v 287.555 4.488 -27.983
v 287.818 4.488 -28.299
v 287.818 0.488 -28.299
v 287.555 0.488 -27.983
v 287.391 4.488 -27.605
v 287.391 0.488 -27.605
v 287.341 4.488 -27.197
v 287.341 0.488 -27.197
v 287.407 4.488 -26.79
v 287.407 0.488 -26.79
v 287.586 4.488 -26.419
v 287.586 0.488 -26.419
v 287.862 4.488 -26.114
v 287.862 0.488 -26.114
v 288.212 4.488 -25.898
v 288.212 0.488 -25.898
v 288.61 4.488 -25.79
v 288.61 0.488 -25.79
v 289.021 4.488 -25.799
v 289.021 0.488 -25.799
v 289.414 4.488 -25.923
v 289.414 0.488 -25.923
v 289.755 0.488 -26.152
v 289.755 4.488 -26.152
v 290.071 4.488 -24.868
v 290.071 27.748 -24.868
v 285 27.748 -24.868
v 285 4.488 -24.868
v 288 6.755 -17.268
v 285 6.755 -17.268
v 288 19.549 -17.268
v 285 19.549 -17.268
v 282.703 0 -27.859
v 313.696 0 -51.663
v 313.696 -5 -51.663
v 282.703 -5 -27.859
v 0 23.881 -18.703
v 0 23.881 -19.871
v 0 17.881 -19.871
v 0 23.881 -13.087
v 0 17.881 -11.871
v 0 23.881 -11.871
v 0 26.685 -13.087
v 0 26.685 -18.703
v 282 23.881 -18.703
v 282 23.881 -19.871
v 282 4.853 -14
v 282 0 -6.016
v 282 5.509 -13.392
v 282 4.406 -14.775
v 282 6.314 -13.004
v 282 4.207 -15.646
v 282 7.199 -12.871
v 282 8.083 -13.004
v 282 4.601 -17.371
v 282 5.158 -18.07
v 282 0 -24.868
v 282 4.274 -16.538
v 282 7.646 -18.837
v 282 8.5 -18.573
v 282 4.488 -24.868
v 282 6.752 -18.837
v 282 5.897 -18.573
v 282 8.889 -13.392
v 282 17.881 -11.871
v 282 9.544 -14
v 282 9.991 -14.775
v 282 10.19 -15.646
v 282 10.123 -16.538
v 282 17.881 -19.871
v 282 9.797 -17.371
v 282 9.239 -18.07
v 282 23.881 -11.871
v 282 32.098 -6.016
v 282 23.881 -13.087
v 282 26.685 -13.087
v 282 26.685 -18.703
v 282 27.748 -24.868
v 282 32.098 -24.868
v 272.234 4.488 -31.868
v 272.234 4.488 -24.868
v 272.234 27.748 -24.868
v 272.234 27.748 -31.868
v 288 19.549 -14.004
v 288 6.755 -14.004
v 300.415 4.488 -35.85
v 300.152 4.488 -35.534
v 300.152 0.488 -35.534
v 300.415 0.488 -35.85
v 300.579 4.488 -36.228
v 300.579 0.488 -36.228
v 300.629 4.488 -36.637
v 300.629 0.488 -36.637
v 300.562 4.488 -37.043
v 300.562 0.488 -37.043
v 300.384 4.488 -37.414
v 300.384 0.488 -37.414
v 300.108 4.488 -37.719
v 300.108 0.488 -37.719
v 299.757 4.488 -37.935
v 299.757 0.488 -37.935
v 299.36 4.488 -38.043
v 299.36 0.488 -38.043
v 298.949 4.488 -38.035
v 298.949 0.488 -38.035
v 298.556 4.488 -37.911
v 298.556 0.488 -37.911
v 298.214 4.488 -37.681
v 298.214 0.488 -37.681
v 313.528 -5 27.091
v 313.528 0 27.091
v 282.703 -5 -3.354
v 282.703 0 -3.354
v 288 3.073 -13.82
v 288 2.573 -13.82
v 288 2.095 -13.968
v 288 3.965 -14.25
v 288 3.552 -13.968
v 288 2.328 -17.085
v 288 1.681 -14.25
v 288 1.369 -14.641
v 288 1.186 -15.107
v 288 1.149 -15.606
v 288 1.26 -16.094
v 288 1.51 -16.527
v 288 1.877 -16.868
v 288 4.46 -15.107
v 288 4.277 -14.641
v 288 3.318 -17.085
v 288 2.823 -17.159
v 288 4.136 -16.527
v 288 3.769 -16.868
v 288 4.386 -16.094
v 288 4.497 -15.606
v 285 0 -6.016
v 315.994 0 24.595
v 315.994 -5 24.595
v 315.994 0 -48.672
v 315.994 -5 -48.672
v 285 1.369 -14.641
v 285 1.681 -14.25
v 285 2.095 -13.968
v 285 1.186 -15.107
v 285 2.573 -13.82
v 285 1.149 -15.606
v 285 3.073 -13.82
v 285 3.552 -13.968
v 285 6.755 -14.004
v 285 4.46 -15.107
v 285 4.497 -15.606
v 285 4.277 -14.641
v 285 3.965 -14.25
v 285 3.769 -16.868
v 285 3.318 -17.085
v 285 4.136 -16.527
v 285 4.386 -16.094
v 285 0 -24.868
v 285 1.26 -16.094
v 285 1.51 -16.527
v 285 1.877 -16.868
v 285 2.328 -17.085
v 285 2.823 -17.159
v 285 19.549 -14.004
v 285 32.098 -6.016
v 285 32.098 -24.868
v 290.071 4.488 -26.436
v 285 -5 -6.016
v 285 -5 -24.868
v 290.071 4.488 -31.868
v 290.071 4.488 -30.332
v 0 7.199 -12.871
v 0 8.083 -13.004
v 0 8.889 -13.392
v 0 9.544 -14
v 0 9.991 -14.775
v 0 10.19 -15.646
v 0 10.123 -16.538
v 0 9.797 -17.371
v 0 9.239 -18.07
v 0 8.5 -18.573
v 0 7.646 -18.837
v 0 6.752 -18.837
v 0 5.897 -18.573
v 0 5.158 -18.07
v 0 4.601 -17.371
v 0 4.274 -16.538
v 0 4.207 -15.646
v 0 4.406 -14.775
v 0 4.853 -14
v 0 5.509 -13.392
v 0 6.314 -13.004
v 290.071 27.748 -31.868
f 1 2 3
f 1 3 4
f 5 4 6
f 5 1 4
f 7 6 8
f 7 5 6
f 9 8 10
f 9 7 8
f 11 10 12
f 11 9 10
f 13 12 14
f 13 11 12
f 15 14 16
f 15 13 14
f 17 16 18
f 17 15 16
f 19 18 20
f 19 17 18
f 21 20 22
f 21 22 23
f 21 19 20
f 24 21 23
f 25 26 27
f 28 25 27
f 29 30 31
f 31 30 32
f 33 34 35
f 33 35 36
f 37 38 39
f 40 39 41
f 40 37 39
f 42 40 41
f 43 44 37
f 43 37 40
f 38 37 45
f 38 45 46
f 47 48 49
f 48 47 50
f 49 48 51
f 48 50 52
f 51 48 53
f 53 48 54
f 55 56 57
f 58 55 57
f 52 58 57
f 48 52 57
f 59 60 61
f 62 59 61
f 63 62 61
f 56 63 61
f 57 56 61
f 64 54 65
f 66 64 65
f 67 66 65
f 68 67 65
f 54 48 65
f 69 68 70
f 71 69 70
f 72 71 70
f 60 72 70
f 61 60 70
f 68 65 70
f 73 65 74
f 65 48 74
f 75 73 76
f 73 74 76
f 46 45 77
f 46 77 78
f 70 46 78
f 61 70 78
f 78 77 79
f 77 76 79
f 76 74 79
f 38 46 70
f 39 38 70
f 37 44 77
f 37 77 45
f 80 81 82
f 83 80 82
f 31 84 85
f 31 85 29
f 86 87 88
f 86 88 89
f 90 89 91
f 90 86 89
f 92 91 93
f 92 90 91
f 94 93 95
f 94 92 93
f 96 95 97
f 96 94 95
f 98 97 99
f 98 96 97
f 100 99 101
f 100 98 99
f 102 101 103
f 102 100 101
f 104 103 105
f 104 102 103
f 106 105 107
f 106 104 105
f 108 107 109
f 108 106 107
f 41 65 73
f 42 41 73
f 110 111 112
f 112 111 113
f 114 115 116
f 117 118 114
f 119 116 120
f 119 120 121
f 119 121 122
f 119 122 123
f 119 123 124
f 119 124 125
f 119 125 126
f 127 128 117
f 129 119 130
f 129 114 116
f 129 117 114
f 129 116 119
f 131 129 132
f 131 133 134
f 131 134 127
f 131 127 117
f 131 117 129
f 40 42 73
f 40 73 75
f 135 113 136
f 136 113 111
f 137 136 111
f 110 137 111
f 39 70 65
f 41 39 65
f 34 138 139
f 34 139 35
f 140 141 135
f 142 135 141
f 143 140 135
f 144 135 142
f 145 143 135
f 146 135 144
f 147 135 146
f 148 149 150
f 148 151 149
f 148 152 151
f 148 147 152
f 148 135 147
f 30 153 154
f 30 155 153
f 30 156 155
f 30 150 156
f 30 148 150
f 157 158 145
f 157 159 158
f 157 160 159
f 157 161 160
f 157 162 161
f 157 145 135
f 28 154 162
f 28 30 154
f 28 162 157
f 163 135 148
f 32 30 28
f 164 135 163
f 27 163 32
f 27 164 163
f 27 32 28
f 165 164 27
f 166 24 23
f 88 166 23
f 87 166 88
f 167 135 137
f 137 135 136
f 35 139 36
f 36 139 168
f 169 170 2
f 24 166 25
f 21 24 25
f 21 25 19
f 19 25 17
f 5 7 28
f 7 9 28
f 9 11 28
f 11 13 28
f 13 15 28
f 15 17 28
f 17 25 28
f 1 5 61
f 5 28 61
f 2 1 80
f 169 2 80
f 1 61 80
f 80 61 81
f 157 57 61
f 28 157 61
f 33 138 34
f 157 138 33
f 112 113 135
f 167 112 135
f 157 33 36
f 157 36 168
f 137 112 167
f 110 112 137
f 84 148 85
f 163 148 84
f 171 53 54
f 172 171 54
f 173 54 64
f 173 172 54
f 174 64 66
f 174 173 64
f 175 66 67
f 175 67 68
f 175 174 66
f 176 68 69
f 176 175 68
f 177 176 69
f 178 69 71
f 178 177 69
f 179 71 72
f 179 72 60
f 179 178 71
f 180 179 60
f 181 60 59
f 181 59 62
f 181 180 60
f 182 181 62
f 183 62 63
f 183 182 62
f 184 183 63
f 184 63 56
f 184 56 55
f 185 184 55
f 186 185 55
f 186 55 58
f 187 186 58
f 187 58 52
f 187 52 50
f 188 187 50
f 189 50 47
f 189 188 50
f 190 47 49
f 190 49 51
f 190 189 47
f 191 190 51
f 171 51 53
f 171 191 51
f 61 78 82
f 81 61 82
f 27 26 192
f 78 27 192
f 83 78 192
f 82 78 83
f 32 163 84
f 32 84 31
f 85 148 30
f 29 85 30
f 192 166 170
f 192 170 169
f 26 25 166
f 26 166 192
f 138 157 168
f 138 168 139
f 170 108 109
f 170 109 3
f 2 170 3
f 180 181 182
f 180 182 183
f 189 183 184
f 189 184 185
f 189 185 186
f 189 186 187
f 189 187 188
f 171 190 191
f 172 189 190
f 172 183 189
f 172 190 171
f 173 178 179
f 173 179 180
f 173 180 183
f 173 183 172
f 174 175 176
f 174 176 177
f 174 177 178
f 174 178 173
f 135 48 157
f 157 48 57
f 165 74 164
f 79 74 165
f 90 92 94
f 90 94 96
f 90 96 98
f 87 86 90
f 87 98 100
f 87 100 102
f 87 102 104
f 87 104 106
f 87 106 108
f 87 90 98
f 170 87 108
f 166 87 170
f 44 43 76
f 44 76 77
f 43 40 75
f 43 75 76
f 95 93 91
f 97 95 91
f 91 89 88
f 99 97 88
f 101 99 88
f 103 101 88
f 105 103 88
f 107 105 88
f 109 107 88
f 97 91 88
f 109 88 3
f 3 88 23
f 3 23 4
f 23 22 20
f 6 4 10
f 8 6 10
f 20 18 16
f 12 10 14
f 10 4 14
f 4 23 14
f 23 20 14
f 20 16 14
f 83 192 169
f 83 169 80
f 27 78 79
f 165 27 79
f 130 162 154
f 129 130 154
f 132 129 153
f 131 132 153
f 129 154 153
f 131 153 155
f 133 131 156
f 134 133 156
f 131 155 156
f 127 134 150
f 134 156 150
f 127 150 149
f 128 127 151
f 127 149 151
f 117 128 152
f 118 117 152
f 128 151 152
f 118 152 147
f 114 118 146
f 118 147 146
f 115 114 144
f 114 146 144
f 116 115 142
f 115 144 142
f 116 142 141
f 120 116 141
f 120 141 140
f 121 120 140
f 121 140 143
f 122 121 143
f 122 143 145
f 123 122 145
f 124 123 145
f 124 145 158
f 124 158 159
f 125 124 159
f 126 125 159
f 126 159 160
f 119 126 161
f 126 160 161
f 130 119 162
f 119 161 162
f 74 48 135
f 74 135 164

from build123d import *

# Parameters (mm, degrees)
SKETCH2_R             = 3
BOSS_EXTRUDE1_DEPTH   = 282
BOSS_EXTRUDE1_2_DEPTH = 282
SKETCH3_W             = 18.85204283
SKETCH3_H             = 32.098048838
BOSS_EXTRUDE2_DEPTH   = 3
BOSS_EXTRUDE3_DEPTH   = 5
BOSS_EXTRUDE3_2_DEPTH = 5
SKETCH5_W             = 17.836431683
SKETCH5_H             = 23.2602474
BOSS_EXTRUDE4_DEPTH   = 7
BOSS_EXTRUDE5_DEPTH   = 4
SKETCH7_R             = 1.678913889
SKETCH7_W             = 3.263600104
SKETCH7_H             = 12.793858283
BOSS_EXTRUDE6_DEPTH   = 3


with BuildPart() as part:
    # Sketch2 → Boss-Extrude1 (new body)
    with BuildSketch(Plane.ZY):
        with Locations((-15.87058853, 7.198699216)):
            Circle(SKETCH2_R)
    extrude(amount=-BOSS_EXTRUDE1_DEPTH)



with BuildPart() as body_2:
    # Sketch2 → Boss-Extrude1 2 (new body)
    with BuildSketch(Plane.ZY):
        Polygon((-19.87058853, 17.881027255), (-11.87058853, 17.881027255), (-11.87058853, 23.881027255), (-13.086657096, 23.881027255), (-13.086657096, 26.684981869), (-18.703311227, 26.684981869), (-18.703311227, 23.881027255), (-19.87058853, 23.881027255), align=None)
    extrude(amount=-BOSS_EXTRUDE1_2_DEPTH)


with BuildPart() as part_1:
    add(part.part)

    add(body_2.part)  # Boss-Extrude2 merges body 2
    # Sketch3 → Boss-Extrude2 (add)
    with BuildSketch(Plane(origin=(282, 0, 0), x_dir=(0, 0, -1), z_dir=(1, 0, 0))):
        with Locations((15.442133011, 16.049024419)):
            Rectangle(SKETCH3_W, SKETCH3_H)
    extrude(amount=BOSS_EXTRUDE2_DEPTH)

    # Sketch5 → Boss-Extrude4 (add)
    with BuildSketch(Plane(origin=(0, 0, -24.868154426), x_dir=(-1, 0, 0), z_dir=(0, 0, -1))):
        with Locations((-281.152419038, 16.118209998)):
            Rectangle(SKETCH5_W, SKETCH5_H)
    extrude(amount=BOSS_EXTRUDE4_DEPTH)

    # Sketch6 → Boss-Extrude5 (add)
    with BuildSketch(Plane.XZ.offset(-4.488086298)):
        with BuildLine():
            Line((289.755481647, -26.15198938), (300.152156309, -35.533967686))
            ThreePointArc((300.152156309, -35.533967686), (300.256943196, -37.576493481), (298.214417401, -37.681280369))
            Line((298.214417401, -37.681280369), (287.817742739, -28.299302063))
            ThreePointArc((287.817742739, -28.299302063), (287.712955852, -26.256776267), (289.755481647, -26.15198938))
        make_face()
    extrude(amount=BOSS_EXTRUDE5_DEPTH)

    # Sketch7 → Boss-Extrude6 (add)
    with BuildSketch(Plane(origin=(285, 0, 0), x_dir=(0, 0, -1), z_dir=(1, 0, 0))):
        with Locations((15.480360711, 2.823096133)):
            Circle(SKETCH7_R)
        with Locations((15.636124716, 13.151660915)):
            Rectangle(SKETCH7_W, SKETCH7_H)
    extrude(amount=BOSS_EXTRUDE6_DEPTH)


with BuildPart() as body_2_2:
    # Sketch4 → Boss-Extrude3 (new body)
    with BuildSketch(Plane.XZ):
        Polygon((285, -24.868154426), (315.993567271, -48.671964131), (313.696349111, -51.663039361), (282.70278184, -27.859229656), align=None)
    extrude(amount=BOSS_EXTRUDE3_DEPTH)


with BuildPart() as body_3:
    # Sketch4 → Boss-Extrude3 2 (new body)
    with BuildSketch(Plane.XZ):
        Polygon((285, -6.016111596), (315.993567271, 24.594647062), (313.52845125, 27.090591056), (282.70278184, -3.354343486), align=None)
    extrude(amount=BOSS_EXTRUDE3_2_DEPTH)


solid = Compound([part_1.part, body_2_2.part, body_3.part])
